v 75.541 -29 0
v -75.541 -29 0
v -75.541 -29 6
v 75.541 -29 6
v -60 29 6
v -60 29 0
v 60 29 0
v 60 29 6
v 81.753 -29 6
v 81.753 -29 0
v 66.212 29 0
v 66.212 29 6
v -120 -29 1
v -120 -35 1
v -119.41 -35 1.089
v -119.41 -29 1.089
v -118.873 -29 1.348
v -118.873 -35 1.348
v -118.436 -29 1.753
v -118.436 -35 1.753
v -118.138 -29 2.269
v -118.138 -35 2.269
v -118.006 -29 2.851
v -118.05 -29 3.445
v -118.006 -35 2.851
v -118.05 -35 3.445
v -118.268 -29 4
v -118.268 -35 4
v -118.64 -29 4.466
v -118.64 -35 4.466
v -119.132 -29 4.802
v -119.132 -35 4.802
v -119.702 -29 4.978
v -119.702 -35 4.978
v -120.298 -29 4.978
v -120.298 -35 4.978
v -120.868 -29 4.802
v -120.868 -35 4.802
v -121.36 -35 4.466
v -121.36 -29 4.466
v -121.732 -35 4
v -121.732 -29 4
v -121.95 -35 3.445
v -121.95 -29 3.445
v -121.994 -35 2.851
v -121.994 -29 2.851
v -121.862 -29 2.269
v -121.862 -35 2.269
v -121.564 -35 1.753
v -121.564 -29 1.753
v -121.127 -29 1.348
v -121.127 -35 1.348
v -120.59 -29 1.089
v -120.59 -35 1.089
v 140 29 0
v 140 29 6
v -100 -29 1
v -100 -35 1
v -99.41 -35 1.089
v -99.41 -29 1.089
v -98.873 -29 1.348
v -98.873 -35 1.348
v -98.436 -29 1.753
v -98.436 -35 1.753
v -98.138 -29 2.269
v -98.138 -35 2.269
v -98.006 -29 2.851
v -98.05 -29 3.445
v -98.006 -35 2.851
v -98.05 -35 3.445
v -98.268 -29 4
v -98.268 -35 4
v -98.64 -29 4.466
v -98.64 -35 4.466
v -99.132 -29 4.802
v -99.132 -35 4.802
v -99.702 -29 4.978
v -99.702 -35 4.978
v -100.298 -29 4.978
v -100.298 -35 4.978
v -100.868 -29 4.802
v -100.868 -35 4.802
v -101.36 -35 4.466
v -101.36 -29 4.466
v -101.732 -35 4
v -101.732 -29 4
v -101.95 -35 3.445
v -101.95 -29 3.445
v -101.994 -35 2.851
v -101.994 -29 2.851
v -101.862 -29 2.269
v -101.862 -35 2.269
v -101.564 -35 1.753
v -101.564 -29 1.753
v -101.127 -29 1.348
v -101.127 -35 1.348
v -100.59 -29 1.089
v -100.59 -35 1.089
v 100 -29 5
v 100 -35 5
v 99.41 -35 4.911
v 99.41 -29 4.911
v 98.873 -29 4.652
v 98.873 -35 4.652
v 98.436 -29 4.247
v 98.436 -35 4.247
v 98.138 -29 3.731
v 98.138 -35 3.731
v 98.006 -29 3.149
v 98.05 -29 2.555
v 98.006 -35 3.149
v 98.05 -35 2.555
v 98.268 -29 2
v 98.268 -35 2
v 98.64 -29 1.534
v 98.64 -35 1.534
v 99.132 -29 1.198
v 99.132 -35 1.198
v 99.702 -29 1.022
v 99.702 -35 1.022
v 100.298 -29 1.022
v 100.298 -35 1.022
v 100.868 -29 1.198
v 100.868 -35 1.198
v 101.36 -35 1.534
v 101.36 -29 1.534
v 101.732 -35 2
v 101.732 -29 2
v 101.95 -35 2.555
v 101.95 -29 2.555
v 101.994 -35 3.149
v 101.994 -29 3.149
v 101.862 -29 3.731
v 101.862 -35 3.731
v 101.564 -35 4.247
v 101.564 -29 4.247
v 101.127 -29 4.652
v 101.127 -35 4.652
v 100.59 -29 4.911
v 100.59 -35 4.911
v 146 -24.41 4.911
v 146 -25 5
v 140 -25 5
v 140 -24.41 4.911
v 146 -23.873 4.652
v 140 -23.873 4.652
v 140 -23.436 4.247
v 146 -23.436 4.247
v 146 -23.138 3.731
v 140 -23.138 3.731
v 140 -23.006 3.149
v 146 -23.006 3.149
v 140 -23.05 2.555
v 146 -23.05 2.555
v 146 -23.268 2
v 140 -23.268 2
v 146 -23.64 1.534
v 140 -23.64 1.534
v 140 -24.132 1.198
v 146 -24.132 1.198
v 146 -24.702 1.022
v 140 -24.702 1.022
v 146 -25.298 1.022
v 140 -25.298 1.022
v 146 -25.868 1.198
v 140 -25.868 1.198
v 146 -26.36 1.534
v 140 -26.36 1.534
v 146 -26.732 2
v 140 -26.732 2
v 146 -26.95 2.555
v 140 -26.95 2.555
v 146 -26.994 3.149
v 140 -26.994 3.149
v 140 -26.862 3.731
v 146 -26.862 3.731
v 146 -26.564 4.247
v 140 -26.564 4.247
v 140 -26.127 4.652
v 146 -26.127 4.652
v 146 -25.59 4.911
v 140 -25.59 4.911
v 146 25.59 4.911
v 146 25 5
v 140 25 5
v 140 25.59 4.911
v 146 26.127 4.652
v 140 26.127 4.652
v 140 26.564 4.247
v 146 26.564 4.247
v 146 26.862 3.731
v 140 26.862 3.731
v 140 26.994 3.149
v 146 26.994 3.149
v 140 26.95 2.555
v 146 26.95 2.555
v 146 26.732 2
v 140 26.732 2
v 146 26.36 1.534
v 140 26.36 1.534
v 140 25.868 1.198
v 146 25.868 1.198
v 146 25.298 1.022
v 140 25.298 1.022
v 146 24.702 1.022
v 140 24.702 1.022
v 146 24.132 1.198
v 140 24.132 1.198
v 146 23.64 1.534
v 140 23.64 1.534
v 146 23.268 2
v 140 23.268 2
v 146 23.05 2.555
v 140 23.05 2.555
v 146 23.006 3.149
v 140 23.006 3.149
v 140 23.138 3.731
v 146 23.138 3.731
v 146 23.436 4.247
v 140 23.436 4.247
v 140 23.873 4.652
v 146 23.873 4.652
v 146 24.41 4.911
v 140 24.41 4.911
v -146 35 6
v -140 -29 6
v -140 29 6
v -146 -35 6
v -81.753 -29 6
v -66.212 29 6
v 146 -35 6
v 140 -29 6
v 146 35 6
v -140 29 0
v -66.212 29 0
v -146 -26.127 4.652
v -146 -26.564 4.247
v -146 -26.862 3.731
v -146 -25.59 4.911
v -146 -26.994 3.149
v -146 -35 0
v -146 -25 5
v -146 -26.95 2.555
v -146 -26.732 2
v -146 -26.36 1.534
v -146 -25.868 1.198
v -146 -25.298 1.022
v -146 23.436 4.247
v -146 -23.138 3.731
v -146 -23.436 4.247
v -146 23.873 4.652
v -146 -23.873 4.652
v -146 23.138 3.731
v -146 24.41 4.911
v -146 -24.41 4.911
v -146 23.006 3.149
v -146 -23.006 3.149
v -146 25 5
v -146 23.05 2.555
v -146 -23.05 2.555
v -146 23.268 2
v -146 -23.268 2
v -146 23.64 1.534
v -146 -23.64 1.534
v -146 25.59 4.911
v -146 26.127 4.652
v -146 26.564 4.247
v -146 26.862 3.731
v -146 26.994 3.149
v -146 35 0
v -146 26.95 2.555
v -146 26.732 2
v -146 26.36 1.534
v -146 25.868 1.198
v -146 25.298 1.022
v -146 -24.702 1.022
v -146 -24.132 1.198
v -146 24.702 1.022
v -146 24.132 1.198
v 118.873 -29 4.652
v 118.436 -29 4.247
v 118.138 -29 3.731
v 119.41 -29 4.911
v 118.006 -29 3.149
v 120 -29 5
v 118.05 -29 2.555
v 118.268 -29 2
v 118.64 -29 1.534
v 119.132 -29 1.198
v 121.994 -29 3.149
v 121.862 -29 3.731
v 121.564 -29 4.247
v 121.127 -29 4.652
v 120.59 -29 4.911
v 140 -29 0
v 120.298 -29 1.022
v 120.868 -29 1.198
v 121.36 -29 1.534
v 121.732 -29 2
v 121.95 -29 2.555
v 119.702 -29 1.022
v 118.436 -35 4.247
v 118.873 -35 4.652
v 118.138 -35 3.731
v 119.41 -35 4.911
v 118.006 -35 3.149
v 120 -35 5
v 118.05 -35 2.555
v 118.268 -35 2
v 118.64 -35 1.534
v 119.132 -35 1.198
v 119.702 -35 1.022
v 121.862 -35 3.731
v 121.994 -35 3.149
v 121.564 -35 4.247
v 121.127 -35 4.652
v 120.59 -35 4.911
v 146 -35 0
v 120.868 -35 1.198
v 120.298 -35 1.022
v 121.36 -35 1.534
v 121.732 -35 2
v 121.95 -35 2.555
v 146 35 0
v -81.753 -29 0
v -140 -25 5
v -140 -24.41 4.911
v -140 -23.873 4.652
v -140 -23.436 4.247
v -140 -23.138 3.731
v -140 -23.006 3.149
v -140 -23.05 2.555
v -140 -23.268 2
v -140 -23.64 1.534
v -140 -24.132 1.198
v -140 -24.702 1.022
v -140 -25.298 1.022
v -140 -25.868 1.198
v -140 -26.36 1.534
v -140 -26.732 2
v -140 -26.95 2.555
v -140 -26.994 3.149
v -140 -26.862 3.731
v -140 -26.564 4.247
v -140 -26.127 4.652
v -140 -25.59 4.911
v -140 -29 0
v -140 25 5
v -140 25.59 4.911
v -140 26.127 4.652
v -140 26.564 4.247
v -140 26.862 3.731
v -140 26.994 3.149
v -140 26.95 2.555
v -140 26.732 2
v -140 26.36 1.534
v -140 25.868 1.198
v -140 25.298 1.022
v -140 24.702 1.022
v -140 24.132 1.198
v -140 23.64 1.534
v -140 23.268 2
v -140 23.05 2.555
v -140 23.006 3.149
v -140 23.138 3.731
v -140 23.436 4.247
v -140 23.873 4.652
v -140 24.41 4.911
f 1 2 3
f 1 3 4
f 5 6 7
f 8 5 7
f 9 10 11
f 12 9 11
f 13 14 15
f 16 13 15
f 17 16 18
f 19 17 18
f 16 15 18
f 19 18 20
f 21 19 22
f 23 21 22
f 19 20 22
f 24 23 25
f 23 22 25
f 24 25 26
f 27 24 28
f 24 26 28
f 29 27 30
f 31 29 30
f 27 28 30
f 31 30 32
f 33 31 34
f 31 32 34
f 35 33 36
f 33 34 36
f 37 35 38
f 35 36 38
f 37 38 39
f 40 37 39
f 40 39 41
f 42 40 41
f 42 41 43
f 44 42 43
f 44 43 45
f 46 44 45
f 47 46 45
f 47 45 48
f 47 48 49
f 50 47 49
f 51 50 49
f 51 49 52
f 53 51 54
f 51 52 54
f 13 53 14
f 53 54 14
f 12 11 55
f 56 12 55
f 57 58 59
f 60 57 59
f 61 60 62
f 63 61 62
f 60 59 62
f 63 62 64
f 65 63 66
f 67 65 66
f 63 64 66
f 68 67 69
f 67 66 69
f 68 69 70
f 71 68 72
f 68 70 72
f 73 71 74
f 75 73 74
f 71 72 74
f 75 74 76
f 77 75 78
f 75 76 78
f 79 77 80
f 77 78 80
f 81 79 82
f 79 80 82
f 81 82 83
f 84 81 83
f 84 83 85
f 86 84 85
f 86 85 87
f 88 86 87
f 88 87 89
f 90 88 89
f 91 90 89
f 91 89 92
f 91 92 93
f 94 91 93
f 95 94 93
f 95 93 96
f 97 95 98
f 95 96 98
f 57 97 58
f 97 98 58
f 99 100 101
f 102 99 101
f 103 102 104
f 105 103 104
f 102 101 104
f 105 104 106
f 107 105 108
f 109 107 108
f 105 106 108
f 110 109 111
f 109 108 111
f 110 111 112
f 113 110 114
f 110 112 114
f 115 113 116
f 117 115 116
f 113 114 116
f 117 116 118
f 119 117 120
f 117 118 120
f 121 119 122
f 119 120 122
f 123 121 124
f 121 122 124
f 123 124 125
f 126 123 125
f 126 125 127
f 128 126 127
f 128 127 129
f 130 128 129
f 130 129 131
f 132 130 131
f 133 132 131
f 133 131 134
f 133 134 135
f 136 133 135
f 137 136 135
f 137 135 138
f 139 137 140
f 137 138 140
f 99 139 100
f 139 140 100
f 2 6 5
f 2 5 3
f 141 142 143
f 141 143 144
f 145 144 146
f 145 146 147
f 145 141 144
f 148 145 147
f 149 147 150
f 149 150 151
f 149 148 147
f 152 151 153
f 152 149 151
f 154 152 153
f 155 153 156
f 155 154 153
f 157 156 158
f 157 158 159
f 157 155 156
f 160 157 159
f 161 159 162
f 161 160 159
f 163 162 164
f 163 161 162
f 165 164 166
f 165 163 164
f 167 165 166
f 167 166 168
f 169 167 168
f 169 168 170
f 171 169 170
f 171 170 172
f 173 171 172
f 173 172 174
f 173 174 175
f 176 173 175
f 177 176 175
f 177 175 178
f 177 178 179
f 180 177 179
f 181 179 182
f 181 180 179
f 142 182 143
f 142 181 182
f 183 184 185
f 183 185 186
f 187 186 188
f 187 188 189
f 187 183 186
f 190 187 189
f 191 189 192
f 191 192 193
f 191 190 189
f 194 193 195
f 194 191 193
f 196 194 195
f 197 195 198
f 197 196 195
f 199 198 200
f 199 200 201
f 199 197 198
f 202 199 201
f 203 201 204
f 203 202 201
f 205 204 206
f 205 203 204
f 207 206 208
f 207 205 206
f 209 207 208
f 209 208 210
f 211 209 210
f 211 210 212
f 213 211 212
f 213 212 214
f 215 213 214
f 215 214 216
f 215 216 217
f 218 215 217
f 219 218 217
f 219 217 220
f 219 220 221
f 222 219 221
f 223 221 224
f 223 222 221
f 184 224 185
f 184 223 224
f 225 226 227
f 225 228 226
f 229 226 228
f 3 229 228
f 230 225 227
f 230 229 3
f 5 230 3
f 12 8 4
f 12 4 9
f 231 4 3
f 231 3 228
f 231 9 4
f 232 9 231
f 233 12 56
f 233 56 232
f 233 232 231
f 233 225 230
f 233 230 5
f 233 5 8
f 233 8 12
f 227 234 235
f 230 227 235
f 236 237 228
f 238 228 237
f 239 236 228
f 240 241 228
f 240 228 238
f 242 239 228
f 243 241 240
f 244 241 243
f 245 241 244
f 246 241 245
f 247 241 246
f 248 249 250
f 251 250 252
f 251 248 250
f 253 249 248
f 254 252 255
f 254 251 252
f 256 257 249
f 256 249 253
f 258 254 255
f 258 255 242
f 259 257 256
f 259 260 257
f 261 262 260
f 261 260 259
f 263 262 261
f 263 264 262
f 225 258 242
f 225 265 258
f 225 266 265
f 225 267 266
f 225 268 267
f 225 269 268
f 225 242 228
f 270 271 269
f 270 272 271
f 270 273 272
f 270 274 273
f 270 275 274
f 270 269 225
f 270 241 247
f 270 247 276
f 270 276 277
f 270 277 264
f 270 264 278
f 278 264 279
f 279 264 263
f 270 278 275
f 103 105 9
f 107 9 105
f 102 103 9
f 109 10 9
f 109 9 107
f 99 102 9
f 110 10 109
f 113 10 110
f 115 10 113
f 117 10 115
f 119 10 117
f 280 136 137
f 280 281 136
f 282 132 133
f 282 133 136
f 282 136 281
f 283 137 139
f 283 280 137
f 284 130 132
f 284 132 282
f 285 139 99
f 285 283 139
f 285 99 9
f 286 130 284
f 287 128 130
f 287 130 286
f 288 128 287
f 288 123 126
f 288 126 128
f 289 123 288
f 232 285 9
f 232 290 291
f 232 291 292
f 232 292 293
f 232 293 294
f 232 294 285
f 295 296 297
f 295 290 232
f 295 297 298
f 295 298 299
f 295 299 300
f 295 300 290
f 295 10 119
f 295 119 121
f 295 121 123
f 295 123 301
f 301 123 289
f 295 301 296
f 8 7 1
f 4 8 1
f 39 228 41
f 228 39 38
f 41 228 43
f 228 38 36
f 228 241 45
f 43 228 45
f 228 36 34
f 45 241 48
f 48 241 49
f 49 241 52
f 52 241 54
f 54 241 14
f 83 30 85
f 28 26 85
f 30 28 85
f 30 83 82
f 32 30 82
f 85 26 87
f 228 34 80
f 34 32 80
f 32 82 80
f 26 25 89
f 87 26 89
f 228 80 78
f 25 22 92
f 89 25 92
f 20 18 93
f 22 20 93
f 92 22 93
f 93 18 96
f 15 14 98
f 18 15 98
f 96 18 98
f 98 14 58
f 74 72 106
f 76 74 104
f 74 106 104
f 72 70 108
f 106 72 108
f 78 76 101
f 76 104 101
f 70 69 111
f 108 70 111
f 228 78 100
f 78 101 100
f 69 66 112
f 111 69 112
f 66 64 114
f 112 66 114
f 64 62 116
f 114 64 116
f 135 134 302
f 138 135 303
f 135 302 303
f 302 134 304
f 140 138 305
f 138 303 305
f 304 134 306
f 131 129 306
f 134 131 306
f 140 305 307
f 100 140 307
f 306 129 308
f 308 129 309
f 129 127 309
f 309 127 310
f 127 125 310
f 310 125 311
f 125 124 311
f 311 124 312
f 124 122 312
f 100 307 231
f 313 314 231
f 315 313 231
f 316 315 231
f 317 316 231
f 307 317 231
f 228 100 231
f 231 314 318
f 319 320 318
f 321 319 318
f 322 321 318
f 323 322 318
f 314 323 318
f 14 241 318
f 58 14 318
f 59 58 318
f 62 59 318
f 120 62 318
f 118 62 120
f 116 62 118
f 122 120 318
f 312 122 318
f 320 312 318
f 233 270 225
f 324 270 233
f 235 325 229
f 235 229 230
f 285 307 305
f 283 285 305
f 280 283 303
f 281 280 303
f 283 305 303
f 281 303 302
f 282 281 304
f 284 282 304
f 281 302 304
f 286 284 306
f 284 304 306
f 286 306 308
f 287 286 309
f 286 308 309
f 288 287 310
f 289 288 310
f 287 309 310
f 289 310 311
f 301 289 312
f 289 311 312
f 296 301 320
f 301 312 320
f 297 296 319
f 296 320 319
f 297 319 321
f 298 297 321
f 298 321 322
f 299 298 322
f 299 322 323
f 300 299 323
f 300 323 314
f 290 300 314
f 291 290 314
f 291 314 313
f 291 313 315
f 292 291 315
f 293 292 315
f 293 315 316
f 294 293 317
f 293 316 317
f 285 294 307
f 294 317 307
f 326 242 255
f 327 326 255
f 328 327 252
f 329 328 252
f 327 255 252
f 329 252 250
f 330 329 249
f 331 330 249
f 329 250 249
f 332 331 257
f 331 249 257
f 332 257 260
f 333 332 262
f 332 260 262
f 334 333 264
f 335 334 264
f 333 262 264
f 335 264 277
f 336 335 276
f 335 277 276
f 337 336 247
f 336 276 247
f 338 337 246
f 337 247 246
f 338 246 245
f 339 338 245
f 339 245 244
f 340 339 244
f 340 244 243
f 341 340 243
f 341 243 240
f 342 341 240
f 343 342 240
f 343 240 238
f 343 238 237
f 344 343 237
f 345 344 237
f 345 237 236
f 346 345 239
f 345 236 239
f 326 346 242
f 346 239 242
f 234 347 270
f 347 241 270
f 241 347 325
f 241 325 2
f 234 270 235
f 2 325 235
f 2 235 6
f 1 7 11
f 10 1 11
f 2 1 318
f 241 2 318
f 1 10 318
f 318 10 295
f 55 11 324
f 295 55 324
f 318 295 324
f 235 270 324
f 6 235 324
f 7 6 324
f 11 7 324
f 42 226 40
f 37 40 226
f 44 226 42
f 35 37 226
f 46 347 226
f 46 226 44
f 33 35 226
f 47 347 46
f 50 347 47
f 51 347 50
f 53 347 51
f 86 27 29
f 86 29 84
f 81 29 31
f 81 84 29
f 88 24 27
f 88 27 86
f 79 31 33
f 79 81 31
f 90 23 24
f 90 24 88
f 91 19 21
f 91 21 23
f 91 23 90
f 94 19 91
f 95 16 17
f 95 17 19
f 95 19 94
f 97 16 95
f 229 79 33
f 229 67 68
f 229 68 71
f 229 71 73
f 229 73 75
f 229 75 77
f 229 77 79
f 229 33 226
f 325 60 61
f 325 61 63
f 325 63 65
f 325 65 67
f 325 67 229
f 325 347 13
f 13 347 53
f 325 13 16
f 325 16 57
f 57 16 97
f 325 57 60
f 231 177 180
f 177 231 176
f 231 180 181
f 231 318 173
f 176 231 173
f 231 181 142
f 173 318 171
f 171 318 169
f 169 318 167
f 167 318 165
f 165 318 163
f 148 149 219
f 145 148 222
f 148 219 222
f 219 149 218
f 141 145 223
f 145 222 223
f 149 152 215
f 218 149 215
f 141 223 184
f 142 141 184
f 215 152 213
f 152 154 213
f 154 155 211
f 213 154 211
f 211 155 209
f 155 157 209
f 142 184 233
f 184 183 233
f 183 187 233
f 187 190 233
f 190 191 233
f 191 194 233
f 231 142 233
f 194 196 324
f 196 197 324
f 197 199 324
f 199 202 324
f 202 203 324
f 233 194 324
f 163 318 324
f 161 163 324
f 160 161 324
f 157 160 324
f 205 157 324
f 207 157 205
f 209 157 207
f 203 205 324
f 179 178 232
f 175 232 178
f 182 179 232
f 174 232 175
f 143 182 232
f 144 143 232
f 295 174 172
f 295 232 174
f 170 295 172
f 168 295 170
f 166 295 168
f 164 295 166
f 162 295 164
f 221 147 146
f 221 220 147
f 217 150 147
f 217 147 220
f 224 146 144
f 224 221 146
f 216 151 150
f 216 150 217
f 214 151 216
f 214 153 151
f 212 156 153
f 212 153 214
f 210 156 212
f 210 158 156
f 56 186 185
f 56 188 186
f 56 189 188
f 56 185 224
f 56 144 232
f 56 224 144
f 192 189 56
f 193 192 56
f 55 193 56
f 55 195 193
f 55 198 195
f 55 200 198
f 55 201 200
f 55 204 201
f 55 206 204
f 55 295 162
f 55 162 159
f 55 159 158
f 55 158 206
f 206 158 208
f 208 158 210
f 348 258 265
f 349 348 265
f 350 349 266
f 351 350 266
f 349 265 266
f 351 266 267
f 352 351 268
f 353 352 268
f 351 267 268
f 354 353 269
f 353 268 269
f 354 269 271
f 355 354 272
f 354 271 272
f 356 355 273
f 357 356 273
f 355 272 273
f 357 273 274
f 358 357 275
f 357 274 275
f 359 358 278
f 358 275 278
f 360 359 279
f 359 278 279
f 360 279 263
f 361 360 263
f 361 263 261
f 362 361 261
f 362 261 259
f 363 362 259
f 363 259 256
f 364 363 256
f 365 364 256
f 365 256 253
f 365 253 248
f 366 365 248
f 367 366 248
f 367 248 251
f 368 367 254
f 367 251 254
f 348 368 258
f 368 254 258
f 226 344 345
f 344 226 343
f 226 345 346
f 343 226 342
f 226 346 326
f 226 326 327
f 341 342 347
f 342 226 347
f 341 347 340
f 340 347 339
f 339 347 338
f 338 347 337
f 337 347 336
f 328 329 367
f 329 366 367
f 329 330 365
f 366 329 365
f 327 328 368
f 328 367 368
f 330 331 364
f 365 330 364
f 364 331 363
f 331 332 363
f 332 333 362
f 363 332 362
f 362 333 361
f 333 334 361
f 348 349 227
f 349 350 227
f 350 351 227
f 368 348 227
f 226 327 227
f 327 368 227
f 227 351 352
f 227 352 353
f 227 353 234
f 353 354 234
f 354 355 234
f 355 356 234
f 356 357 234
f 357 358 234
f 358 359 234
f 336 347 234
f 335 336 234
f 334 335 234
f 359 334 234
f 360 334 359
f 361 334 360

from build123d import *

# Parameters (mm, degrees)
SKETCH_1_W          = 292
SKETCH_1_H          = 70
SKETCH_1_W_2        = 280
SKETCH_1_H_2        = 58
EXTRUDE_1_DEPTH     = 6
EXTRUDE_2_DEPTH     = 6
SKETCH_3_R          = 2
CUT_EXTRUDE_1_DEPTH = 6
SKETCH_4_R          = 2
CUT_EXTRUDE_2_DEPTH = 6


with BuildPart() as part:
    # 草图1 → 凸台-拉伸1 (new body)
    with BuildSketch(Plane.XY):
        Rectangle(SKETCH_1_W, SKETCH_1_H)
        Rectangle(SKETCH_1_W_2, SKETCH_1_H_2, mode=Mode.SUBTRACT)
    extrude(amount=EXTRUDE_1_DEPTH)

    # 草图2 → 凸台-拉伸2 (add)
    with BuildSketch(Plane.XY):
        Polygon((-78.646881702, -29), (-81.752710243, -29), (-66.211657082, 29), (-60, 29), (-75.541053161, -29), align=None)
        Polygon((75.541053161, -29), (78.646881702, -29), (81.752710243, -29), (66.211657082, 29), (60, 29), align=None)
    extrude(amount=EXTRUDE_2_DEPTH)

    # 草图3 → 切除-拉伸1 (cut)
    with BuildSketch(Plane.ZY.offset(146)):
        with Locations((3, 25)):
            Circle(SKETCH_3_R)
        with Locations((3, -25)):
            Circle(SKETCH_3_R)
    cut_extrude_1 = extrude(amount=-CUT_EXTRUDE_1_DEPTH, mode=Mode.SUBTRACT)

    # 镜向1: 切除-拉伸1 across plane
    add(cut_extrude_1.mirror(Plane(origin=(0, 0, 0), x_dir=(0, 0, 1), z_dir=(1, 0, 0))), mode=Mode.SUBTRACT)

    # 草图4 → 切除-拉伸2 (cut)
    with BuildSketch(Plane.XZ.offset(35)):
        with Locations(Location((-120, 3, 0), (0, 0, 270))):
            Circle(SKETCH_4_R)
        with Locations(Location((-100, 3, 0), (0, 0, 270))):
            Circle(SKETCH_4_R)
        with Locations(Location((120, 3, 0), (0, 0, 90))):
            Circle(SKETCH_4_R)
        with Locations(Location((100, 3, 0), (0, 0, 90))):
            Circle(SKETCH_4_R)
    extrude(amount=-CUT_EXTRUDE_2_DEPTH, mode=Mode.SUBTRACT)


solid = part.part
